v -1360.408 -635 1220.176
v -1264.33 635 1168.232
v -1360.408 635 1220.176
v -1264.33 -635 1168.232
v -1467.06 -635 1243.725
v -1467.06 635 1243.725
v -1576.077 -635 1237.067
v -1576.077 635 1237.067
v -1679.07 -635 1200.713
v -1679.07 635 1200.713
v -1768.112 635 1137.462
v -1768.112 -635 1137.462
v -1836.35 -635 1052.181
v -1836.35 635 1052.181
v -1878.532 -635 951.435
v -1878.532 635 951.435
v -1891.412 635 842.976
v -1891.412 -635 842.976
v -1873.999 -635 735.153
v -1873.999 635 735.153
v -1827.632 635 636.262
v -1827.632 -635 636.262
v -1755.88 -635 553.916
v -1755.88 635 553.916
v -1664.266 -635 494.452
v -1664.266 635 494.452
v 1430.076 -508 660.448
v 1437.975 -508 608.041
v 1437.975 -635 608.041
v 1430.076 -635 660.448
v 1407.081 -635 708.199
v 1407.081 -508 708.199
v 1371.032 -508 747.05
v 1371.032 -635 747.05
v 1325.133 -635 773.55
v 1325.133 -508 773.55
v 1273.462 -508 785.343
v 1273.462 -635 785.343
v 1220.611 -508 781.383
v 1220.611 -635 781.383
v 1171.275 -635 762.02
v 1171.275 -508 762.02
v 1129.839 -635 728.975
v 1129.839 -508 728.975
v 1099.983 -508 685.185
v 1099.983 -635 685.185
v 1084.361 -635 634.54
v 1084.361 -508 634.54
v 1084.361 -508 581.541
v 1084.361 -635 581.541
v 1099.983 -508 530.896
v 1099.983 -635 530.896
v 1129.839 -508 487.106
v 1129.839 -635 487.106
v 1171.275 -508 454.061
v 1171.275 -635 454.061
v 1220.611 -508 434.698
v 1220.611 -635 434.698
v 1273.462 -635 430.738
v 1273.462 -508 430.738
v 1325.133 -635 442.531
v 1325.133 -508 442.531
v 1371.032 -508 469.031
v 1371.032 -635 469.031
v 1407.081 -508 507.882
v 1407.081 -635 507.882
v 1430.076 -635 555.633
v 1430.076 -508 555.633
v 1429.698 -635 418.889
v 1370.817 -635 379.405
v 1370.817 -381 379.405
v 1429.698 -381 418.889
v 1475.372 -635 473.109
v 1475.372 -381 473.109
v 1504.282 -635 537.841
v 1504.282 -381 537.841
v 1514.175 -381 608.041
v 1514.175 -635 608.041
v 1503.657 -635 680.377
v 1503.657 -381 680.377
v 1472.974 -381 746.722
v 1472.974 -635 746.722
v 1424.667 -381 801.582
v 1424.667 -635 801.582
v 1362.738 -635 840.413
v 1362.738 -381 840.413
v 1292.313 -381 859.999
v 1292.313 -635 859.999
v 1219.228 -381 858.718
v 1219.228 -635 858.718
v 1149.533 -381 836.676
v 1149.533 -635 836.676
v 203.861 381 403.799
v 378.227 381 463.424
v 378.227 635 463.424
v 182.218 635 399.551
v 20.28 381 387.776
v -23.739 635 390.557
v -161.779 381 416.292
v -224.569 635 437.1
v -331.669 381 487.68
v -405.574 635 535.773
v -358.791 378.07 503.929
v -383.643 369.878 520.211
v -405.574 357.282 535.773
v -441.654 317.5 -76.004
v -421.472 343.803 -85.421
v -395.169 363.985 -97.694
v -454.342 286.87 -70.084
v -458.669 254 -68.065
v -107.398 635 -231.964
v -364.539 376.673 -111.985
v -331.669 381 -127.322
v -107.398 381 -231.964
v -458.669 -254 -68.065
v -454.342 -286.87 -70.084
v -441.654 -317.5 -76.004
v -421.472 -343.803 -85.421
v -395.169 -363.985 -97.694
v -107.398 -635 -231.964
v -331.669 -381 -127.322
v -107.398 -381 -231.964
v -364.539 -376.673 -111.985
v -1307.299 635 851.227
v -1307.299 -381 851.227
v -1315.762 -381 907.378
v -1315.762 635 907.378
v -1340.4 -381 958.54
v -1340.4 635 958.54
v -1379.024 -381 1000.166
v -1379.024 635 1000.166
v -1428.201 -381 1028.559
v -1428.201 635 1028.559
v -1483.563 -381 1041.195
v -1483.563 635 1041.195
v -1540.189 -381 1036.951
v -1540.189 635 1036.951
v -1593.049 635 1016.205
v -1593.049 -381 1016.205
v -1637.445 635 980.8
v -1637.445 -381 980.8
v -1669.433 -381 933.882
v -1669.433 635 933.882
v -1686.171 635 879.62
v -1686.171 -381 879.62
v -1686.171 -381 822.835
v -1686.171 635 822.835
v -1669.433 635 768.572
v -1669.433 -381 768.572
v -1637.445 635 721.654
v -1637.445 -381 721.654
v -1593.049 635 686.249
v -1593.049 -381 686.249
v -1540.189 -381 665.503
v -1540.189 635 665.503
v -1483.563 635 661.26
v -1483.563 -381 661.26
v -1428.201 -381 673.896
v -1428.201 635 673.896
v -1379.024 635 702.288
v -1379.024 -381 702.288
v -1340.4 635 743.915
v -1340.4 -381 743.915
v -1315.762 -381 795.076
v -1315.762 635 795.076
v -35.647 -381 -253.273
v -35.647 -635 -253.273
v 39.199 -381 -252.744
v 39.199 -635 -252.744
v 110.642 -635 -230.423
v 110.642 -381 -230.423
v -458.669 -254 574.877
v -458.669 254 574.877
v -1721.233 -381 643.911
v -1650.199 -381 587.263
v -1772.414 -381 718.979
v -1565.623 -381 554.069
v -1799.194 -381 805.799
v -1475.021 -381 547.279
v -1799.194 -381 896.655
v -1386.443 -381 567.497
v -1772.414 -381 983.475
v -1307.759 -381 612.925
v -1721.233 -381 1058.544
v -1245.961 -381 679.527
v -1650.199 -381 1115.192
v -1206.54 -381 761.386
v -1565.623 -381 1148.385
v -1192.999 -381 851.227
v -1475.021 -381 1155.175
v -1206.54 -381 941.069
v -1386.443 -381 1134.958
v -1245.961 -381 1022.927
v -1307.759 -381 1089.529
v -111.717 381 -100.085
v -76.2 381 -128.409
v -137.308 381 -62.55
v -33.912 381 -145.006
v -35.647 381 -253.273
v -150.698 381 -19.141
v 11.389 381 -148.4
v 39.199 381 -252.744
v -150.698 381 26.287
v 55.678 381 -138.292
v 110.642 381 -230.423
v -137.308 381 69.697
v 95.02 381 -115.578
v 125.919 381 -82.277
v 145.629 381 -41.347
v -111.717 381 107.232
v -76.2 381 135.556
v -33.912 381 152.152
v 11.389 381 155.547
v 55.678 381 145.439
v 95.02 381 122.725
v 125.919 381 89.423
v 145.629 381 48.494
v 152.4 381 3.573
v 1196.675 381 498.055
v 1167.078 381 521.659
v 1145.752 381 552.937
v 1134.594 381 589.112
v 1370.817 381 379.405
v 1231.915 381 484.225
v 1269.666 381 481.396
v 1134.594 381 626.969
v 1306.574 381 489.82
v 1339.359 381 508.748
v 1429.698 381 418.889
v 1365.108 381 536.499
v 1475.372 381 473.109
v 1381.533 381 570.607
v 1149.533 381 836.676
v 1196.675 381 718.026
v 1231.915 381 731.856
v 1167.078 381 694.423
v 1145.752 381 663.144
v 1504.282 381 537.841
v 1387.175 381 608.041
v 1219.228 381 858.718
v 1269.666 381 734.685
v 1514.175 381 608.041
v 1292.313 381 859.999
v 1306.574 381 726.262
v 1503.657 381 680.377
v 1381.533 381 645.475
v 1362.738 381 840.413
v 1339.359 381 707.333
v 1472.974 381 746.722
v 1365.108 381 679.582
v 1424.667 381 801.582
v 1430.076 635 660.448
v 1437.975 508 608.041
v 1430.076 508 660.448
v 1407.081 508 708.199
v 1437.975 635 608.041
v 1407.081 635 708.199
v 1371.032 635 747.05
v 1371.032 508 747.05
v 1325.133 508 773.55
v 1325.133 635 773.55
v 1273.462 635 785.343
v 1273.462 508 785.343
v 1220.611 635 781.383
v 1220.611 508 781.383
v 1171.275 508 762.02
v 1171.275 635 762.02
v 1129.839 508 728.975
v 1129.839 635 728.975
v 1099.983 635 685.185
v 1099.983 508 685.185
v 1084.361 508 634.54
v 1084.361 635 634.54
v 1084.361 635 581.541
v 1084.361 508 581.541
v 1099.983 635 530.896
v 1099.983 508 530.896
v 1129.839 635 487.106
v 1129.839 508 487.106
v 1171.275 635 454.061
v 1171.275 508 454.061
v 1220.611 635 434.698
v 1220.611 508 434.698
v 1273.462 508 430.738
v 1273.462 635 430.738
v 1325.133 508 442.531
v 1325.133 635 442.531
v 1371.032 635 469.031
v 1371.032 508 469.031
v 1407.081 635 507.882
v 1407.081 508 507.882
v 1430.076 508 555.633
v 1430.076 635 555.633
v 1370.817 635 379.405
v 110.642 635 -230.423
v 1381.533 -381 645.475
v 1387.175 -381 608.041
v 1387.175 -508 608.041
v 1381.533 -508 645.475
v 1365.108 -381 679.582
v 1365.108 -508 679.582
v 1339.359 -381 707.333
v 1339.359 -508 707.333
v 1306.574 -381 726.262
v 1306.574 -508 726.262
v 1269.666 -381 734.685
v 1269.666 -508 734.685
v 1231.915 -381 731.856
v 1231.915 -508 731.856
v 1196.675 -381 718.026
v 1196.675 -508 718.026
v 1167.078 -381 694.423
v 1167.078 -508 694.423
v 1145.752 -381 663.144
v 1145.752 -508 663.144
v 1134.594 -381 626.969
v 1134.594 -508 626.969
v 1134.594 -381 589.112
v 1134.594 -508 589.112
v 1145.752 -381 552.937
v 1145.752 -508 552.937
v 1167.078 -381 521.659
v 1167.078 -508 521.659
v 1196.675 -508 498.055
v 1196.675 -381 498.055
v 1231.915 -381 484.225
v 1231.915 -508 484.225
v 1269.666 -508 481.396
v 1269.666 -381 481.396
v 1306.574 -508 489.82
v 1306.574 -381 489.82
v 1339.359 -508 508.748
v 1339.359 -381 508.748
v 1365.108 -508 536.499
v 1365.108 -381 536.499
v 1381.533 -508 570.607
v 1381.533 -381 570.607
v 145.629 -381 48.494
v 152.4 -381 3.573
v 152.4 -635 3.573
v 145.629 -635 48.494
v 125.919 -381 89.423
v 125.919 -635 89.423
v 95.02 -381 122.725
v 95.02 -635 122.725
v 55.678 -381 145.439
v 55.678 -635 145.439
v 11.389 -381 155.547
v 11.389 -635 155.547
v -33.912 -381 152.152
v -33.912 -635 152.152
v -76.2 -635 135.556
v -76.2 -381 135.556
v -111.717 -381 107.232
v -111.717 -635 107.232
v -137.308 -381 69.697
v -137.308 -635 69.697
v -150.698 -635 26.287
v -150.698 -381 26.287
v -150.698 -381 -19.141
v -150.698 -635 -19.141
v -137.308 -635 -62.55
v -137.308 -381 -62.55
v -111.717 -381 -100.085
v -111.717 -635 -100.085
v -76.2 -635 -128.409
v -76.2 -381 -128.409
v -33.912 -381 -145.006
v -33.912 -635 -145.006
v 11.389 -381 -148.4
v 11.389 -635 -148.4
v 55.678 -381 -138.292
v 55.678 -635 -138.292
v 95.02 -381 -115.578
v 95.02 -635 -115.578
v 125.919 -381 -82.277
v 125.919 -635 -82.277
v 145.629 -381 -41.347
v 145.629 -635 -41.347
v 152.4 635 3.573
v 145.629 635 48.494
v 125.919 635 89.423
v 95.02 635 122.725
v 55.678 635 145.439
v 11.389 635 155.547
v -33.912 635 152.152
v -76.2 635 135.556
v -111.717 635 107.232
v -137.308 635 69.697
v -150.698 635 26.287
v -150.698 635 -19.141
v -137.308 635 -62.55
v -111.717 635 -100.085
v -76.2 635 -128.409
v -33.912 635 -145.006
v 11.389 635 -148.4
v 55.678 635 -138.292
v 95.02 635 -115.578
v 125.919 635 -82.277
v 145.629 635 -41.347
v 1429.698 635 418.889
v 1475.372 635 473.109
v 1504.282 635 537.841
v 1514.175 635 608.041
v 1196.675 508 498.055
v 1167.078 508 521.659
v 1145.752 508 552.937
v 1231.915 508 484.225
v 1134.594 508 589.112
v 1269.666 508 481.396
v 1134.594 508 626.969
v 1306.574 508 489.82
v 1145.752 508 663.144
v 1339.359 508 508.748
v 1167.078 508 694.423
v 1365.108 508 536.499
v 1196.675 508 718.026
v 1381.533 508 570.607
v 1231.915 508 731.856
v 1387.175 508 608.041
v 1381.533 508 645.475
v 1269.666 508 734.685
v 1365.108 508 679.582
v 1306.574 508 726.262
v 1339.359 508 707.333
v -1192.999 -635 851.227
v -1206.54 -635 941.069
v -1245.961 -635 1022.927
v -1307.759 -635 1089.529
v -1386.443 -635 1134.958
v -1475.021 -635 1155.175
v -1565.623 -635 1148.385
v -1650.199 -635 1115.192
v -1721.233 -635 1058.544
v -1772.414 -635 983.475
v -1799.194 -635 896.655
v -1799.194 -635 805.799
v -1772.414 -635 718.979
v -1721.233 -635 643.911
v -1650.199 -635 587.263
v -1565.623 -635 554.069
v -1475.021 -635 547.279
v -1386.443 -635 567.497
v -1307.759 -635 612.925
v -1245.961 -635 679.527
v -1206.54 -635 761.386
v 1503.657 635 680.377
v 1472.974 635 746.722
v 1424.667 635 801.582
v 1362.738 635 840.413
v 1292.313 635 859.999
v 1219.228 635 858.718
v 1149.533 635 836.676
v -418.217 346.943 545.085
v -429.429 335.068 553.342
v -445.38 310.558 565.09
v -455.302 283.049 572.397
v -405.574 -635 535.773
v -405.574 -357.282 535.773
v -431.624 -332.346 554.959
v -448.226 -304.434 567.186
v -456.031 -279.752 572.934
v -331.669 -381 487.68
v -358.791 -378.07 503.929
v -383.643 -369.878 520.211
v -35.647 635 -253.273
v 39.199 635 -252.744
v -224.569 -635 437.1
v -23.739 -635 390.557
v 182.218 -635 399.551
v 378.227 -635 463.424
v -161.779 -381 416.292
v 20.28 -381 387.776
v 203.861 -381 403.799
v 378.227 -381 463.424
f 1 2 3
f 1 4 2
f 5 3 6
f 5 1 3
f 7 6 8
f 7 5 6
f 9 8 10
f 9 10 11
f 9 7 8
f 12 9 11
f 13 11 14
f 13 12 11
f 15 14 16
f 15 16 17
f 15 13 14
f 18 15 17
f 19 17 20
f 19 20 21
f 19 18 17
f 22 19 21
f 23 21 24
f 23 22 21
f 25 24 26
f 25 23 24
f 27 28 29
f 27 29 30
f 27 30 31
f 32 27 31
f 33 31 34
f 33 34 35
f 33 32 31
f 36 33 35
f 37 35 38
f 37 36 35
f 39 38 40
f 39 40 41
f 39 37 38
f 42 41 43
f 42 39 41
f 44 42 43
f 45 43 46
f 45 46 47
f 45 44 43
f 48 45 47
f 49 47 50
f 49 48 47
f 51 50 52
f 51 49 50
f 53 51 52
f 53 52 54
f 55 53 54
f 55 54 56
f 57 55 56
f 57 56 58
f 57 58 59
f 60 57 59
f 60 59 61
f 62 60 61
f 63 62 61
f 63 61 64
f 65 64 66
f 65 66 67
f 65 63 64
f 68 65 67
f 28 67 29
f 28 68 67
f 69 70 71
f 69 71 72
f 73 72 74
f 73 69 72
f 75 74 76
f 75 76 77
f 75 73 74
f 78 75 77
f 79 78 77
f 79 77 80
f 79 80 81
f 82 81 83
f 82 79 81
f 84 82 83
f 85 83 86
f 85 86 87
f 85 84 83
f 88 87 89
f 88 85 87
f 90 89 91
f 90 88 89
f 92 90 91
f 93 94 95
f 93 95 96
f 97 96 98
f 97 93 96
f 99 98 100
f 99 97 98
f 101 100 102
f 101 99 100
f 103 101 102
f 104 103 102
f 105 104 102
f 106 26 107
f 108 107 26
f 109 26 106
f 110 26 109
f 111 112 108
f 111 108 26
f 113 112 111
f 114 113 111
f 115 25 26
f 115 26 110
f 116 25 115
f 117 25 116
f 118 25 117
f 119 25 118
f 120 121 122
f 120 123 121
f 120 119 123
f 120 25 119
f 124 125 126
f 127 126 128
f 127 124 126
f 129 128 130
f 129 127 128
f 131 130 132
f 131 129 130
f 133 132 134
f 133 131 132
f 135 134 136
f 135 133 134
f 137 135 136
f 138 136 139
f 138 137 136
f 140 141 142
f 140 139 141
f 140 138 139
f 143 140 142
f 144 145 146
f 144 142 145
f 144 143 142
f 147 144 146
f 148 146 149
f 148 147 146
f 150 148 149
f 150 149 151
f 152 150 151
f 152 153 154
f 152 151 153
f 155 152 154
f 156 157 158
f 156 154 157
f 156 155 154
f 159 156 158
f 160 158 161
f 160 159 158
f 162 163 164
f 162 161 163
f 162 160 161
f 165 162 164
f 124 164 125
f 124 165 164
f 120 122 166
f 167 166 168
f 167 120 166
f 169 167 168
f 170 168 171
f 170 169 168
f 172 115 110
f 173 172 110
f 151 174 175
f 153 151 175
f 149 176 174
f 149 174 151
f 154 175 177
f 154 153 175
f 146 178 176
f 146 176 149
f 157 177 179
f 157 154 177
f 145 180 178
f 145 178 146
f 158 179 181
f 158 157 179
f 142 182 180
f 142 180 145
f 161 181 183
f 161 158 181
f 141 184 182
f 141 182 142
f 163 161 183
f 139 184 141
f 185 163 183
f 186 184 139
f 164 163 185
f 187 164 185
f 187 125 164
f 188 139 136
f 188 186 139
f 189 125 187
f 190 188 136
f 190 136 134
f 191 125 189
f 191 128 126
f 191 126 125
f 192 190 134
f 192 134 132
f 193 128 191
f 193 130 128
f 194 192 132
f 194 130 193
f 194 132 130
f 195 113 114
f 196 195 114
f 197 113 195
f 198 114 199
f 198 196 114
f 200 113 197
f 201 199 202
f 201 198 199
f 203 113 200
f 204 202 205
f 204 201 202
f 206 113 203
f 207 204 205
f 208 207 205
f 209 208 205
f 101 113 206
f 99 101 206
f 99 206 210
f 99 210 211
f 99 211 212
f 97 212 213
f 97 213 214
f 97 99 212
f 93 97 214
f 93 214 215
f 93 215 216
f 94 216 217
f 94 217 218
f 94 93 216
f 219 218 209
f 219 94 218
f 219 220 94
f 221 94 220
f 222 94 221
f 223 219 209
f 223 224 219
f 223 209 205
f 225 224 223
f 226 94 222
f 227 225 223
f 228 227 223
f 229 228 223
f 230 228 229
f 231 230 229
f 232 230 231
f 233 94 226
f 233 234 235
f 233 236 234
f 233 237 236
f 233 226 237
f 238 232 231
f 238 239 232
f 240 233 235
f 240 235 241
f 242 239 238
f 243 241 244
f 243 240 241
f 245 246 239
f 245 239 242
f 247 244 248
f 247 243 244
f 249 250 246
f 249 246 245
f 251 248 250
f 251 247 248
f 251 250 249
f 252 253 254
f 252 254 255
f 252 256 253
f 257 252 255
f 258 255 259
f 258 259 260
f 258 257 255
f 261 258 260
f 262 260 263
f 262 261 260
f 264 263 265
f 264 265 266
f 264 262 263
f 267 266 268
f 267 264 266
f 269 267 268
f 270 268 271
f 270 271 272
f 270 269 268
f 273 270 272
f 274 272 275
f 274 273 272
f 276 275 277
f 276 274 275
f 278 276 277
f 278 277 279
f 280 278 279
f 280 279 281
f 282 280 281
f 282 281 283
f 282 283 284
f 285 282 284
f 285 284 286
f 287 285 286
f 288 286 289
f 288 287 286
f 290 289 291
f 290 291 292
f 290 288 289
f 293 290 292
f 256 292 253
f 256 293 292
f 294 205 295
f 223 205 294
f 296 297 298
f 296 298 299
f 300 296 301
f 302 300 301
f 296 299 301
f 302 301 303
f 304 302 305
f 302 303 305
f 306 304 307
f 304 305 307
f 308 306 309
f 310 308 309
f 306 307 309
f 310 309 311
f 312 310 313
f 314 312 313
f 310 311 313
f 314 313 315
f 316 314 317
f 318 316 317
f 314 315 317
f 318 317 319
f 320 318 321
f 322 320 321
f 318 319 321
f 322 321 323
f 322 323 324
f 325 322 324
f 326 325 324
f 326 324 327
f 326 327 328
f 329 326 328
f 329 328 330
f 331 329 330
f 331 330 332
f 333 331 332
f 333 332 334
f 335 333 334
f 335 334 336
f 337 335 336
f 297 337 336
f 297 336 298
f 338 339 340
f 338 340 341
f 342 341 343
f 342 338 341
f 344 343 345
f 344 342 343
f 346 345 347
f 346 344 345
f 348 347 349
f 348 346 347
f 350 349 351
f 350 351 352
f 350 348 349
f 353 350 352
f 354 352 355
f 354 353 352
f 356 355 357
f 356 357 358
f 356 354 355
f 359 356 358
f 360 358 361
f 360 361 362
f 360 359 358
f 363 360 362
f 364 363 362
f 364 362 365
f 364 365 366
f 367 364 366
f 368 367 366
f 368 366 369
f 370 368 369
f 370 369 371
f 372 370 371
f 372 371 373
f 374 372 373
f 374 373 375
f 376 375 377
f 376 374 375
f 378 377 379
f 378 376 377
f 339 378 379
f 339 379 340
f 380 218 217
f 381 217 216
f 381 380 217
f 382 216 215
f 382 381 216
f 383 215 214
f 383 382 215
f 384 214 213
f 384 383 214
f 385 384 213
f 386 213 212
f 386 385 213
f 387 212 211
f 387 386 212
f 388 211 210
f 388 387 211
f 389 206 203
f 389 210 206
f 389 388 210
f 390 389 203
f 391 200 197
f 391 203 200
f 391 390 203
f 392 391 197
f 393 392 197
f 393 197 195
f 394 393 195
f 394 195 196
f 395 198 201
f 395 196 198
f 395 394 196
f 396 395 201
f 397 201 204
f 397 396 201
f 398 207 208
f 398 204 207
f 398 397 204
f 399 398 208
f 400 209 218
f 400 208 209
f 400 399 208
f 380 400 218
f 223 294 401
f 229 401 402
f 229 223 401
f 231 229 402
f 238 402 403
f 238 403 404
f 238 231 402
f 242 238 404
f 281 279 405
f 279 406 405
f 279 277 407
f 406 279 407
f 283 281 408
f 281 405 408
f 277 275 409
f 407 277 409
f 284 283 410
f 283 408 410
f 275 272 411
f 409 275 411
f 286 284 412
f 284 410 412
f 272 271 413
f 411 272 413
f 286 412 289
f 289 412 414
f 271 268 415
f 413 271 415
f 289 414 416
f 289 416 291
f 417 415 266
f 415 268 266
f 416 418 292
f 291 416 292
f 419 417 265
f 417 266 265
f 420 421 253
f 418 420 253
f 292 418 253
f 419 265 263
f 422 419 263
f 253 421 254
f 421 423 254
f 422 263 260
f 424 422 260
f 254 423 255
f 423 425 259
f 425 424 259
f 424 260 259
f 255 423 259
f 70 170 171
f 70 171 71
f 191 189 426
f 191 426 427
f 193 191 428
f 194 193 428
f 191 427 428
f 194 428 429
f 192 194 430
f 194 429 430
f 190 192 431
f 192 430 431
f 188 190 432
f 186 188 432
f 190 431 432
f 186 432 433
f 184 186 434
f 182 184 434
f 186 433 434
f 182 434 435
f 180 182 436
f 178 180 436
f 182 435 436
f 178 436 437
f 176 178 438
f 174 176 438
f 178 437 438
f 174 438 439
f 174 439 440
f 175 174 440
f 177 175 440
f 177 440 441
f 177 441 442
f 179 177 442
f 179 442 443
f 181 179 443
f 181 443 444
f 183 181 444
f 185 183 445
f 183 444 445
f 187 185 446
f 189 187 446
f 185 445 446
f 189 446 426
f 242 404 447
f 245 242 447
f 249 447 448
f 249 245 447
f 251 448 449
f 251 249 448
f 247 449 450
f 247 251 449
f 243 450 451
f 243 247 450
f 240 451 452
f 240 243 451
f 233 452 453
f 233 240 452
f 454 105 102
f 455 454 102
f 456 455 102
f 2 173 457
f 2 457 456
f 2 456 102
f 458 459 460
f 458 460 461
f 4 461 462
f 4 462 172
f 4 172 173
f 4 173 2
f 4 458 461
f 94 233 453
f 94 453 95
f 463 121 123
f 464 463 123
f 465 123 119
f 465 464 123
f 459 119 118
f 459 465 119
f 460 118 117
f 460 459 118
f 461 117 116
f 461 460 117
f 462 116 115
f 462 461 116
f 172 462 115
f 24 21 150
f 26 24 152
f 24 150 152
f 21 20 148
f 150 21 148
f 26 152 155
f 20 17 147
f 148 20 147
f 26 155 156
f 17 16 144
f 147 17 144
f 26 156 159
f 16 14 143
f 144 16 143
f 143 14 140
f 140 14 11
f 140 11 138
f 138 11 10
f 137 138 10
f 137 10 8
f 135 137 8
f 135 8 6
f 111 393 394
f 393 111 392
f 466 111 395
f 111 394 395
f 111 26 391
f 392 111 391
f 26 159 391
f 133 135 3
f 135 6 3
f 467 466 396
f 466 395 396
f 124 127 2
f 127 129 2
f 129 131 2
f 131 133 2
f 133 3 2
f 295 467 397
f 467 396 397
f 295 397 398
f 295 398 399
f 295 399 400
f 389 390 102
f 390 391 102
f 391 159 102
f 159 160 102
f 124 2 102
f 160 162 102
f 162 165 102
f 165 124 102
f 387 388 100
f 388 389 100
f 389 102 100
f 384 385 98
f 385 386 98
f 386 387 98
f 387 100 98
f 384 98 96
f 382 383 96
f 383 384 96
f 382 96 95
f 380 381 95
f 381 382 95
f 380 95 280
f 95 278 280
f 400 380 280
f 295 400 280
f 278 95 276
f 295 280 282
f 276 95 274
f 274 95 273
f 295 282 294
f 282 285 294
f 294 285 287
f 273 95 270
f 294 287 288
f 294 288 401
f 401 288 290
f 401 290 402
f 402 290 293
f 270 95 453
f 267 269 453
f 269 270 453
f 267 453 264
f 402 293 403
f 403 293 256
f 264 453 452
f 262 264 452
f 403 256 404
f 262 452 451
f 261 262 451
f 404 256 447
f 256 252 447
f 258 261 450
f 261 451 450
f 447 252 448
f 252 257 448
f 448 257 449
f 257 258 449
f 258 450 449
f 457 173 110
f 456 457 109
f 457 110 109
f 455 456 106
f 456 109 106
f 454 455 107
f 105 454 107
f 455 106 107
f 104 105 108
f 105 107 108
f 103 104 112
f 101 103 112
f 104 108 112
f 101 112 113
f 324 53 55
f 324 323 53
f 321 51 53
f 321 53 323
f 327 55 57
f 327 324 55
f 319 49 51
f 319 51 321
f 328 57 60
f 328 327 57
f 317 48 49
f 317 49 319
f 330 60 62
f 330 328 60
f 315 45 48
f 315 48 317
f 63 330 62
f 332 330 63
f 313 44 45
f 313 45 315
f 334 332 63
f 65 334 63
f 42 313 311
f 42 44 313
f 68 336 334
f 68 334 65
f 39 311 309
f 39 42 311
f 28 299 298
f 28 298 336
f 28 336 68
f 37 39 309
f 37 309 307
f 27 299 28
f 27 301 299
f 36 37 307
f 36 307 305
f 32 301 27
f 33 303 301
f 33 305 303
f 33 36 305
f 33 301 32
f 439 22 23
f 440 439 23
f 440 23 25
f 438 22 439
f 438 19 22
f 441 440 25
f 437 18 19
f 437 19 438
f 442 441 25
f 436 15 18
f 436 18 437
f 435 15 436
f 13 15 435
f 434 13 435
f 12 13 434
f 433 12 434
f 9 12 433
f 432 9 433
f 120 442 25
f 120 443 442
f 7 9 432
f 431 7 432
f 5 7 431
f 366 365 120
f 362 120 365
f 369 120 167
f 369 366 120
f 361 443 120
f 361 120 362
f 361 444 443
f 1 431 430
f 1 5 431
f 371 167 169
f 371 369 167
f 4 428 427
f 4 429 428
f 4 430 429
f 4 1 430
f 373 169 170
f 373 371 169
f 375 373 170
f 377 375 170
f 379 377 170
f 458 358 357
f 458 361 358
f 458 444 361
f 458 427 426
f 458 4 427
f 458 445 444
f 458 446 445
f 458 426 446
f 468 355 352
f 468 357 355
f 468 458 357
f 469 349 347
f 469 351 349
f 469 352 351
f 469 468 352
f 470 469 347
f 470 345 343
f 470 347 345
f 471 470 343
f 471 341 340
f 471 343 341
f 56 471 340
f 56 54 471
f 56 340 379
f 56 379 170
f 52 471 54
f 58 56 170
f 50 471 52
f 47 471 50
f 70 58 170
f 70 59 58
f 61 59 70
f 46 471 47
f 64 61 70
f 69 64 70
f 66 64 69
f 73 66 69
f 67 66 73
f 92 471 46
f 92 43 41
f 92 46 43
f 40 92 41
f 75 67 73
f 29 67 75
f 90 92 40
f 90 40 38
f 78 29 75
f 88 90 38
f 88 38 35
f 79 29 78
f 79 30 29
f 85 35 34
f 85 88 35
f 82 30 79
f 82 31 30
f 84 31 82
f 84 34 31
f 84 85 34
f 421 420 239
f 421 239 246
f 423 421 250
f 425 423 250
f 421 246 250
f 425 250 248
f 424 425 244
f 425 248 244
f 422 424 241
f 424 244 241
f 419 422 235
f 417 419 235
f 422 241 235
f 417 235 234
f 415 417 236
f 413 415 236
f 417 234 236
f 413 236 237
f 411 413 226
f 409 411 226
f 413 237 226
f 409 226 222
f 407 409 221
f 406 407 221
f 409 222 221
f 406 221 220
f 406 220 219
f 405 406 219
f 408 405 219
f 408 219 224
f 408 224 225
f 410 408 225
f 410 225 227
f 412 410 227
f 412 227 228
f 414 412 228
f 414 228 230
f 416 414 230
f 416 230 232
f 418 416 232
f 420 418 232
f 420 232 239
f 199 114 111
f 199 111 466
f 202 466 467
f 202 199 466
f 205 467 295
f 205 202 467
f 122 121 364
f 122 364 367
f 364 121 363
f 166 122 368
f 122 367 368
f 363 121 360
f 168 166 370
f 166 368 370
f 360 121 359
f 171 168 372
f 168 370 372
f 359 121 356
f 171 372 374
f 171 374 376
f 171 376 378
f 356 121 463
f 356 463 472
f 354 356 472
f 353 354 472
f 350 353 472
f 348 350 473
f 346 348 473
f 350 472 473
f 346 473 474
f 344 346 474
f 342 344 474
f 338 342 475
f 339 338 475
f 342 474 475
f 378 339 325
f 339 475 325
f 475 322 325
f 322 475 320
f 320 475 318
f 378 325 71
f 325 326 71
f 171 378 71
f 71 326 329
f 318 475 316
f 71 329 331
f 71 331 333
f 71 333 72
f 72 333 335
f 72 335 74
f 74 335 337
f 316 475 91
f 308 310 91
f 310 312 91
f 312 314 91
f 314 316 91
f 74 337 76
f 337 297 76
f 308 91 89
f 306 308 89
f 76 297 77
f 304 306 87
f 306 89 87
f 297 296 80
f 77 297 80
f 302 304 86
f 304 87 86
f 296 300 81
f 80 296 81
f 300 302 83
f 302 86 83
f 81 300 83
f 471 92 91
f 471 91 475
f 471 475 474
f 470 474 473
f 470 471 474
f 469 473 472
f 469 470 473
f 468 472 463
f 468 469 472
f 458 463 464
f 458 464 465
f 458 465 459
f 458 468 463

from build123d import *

# Parameters (mm, degrees)
F0_R     = 190.5
F0_R_2   = 152.4
F0_R_3   = 177.8
F1_DEPTH = 635
F2_DEPTH = 508
F3_R     = 127
F4_DEPTH = 1270.001
F3_R_2   = 304.8
F5_DEPTH = 254
F6_W     = 2286
F6_H     = 762
F7_DEPTH = 1270
F8_R     = 127


with BuildPart() as f1:
    # F0 (on Front) → F1 (new body, symmetric)
    with BuildSketch(Plane.XZ):
        with BuildLine():
            ThreePointArc((-1264.330122, 1168.232121), (-1836.350214, 1052.18126), (-1664.265743, 494.452184))
            ThreePointArc((-1664.265743, 494.452184), (-1286.302092, 519.15959), (-1104.098667, 851.227187))
            ThreePointArc((-1104.098667, 851.227187), (-1146.432578, 1028.826629), (-1264.330122, 1168.232121))
        make_face()
        with Locations((-1497.798667, 851.227187)):
            Circle(F0_R, mode=Mode.SUBTRACT)
        with BuildLine():
            ThreePointArc((-107.398114, -231.964185), (-136.449403, 212.450395), (254, -1.786764))
            ThreePointArc((254, -1.786764), (215.196514, -136.718081), (110.642046, -230.422583))
            Line((110.642046, -230.422583), (1370.817385, 379.404777))
            ThreePointArc((1370.817385, 379.404777), (1031.539521, 497.39855), (1149.533294, 836.676415))
            Line((1149.533294, 836.676415), (378.226856, 463.423778))
            ThreePointArc((378.226856, 463.423778), (-23.738712, 390.556908), (-405.573884, 535.773296))
            Line((-405.573884, 535.773296), (-1264.330122, 1168.232121))
            ThreePointArc((-1264.330122, 1168.232121), (-1146.432578, 1028.826629), (-1104.098667, 851.227187))
            ThreePointArc((-1104.098667, 851.227187), (-1286.302092, 519.15959), (-1664.265743, 494.452184))
            Line((-1664.265743, 494.452184), (-107.398114, -231.964185))
        make_face()
        with BuildLine():
            ThreePointArc((110.642046, -230.422583), (215.196514, -136.718081), (254, -1.786764))
            ThreePointArc((254, -1.786764), (-136.449403, 212.450395), (-107.398114, -231.964185))
            ThreePointArc((-107.398114, -231.964185), (1.795803, -255.780416), (110.642046, -230.422583))
        make_face()
        with Locations((0, 3.573452)):
            Circle(F0_R_2, mode=Mode.SUBTRACT)
        with BuildLine():
            ThreePointArc((1149.533294, 836.676415), (1031.539521, 497.39855), (1370.817385, 379.404777))
            ThreePointArc((1370.817385, 379.404777), (1475.371854, 473.109279), (1514.175339, 608.040596))
            ThreePointArc((1514.175339, 608.040596), (1395.106656, 823.23711), (1149.533294, 836.676415))
        make_face()
        with Locations((1260.175339, 608.040596)):
            Circle(F0_R_3, mode=Mode.SUBTRACT)
    extrude(amount=F1_DEPTH, both=True)

    # F0 (on Front) → F2 (join, symmetric)
    with BuildSketch(Plane.XZ):
        with Locations((1260.175339, 608.040596)):
            Circle(F0_R_3)
    extrude(amount=F2_DEPTH, both=True)

    # F3 (on face) → F4 (cut, through all)
    with BuildSketch(Plane.XZ.offset(635)):
        with Locations((1260.175339, 608.040596)):
            Circle(F3_R)
    extrude(amount=-F4_DEPTH, mode=Mode.SUBTRACT)

    # F3 (on face) → F5 (cut)
    with BuildSketch(Plane.XZ.offset(635)):
        with Locations((-1497.798667, 851.227187)):
            Circle(F3_R_2)
    extrude(amount=-F5_DEPTH, mode=Mode.SUBTRACT)

    # F6 (on Top) → F7 (cut, symmetric)
    with BuildSketch(Plane.XY):
        with Locations((684.330821, 0)):
            Rectangle(F6_W, F6_H)
    extrude(amount=F7_DEPTH, both=True, mode=Mode.SUBTRACT)

    # F8
    f8_edges = [f1.edges().sort_by_distance(p)[0] for p in [
        (-458.669179, 381, 253.405931),
        (-458.669179, -381, 253.405931),
    ]]
    fillet(f8_edges, radius=F8_R)


solid = f1.part
